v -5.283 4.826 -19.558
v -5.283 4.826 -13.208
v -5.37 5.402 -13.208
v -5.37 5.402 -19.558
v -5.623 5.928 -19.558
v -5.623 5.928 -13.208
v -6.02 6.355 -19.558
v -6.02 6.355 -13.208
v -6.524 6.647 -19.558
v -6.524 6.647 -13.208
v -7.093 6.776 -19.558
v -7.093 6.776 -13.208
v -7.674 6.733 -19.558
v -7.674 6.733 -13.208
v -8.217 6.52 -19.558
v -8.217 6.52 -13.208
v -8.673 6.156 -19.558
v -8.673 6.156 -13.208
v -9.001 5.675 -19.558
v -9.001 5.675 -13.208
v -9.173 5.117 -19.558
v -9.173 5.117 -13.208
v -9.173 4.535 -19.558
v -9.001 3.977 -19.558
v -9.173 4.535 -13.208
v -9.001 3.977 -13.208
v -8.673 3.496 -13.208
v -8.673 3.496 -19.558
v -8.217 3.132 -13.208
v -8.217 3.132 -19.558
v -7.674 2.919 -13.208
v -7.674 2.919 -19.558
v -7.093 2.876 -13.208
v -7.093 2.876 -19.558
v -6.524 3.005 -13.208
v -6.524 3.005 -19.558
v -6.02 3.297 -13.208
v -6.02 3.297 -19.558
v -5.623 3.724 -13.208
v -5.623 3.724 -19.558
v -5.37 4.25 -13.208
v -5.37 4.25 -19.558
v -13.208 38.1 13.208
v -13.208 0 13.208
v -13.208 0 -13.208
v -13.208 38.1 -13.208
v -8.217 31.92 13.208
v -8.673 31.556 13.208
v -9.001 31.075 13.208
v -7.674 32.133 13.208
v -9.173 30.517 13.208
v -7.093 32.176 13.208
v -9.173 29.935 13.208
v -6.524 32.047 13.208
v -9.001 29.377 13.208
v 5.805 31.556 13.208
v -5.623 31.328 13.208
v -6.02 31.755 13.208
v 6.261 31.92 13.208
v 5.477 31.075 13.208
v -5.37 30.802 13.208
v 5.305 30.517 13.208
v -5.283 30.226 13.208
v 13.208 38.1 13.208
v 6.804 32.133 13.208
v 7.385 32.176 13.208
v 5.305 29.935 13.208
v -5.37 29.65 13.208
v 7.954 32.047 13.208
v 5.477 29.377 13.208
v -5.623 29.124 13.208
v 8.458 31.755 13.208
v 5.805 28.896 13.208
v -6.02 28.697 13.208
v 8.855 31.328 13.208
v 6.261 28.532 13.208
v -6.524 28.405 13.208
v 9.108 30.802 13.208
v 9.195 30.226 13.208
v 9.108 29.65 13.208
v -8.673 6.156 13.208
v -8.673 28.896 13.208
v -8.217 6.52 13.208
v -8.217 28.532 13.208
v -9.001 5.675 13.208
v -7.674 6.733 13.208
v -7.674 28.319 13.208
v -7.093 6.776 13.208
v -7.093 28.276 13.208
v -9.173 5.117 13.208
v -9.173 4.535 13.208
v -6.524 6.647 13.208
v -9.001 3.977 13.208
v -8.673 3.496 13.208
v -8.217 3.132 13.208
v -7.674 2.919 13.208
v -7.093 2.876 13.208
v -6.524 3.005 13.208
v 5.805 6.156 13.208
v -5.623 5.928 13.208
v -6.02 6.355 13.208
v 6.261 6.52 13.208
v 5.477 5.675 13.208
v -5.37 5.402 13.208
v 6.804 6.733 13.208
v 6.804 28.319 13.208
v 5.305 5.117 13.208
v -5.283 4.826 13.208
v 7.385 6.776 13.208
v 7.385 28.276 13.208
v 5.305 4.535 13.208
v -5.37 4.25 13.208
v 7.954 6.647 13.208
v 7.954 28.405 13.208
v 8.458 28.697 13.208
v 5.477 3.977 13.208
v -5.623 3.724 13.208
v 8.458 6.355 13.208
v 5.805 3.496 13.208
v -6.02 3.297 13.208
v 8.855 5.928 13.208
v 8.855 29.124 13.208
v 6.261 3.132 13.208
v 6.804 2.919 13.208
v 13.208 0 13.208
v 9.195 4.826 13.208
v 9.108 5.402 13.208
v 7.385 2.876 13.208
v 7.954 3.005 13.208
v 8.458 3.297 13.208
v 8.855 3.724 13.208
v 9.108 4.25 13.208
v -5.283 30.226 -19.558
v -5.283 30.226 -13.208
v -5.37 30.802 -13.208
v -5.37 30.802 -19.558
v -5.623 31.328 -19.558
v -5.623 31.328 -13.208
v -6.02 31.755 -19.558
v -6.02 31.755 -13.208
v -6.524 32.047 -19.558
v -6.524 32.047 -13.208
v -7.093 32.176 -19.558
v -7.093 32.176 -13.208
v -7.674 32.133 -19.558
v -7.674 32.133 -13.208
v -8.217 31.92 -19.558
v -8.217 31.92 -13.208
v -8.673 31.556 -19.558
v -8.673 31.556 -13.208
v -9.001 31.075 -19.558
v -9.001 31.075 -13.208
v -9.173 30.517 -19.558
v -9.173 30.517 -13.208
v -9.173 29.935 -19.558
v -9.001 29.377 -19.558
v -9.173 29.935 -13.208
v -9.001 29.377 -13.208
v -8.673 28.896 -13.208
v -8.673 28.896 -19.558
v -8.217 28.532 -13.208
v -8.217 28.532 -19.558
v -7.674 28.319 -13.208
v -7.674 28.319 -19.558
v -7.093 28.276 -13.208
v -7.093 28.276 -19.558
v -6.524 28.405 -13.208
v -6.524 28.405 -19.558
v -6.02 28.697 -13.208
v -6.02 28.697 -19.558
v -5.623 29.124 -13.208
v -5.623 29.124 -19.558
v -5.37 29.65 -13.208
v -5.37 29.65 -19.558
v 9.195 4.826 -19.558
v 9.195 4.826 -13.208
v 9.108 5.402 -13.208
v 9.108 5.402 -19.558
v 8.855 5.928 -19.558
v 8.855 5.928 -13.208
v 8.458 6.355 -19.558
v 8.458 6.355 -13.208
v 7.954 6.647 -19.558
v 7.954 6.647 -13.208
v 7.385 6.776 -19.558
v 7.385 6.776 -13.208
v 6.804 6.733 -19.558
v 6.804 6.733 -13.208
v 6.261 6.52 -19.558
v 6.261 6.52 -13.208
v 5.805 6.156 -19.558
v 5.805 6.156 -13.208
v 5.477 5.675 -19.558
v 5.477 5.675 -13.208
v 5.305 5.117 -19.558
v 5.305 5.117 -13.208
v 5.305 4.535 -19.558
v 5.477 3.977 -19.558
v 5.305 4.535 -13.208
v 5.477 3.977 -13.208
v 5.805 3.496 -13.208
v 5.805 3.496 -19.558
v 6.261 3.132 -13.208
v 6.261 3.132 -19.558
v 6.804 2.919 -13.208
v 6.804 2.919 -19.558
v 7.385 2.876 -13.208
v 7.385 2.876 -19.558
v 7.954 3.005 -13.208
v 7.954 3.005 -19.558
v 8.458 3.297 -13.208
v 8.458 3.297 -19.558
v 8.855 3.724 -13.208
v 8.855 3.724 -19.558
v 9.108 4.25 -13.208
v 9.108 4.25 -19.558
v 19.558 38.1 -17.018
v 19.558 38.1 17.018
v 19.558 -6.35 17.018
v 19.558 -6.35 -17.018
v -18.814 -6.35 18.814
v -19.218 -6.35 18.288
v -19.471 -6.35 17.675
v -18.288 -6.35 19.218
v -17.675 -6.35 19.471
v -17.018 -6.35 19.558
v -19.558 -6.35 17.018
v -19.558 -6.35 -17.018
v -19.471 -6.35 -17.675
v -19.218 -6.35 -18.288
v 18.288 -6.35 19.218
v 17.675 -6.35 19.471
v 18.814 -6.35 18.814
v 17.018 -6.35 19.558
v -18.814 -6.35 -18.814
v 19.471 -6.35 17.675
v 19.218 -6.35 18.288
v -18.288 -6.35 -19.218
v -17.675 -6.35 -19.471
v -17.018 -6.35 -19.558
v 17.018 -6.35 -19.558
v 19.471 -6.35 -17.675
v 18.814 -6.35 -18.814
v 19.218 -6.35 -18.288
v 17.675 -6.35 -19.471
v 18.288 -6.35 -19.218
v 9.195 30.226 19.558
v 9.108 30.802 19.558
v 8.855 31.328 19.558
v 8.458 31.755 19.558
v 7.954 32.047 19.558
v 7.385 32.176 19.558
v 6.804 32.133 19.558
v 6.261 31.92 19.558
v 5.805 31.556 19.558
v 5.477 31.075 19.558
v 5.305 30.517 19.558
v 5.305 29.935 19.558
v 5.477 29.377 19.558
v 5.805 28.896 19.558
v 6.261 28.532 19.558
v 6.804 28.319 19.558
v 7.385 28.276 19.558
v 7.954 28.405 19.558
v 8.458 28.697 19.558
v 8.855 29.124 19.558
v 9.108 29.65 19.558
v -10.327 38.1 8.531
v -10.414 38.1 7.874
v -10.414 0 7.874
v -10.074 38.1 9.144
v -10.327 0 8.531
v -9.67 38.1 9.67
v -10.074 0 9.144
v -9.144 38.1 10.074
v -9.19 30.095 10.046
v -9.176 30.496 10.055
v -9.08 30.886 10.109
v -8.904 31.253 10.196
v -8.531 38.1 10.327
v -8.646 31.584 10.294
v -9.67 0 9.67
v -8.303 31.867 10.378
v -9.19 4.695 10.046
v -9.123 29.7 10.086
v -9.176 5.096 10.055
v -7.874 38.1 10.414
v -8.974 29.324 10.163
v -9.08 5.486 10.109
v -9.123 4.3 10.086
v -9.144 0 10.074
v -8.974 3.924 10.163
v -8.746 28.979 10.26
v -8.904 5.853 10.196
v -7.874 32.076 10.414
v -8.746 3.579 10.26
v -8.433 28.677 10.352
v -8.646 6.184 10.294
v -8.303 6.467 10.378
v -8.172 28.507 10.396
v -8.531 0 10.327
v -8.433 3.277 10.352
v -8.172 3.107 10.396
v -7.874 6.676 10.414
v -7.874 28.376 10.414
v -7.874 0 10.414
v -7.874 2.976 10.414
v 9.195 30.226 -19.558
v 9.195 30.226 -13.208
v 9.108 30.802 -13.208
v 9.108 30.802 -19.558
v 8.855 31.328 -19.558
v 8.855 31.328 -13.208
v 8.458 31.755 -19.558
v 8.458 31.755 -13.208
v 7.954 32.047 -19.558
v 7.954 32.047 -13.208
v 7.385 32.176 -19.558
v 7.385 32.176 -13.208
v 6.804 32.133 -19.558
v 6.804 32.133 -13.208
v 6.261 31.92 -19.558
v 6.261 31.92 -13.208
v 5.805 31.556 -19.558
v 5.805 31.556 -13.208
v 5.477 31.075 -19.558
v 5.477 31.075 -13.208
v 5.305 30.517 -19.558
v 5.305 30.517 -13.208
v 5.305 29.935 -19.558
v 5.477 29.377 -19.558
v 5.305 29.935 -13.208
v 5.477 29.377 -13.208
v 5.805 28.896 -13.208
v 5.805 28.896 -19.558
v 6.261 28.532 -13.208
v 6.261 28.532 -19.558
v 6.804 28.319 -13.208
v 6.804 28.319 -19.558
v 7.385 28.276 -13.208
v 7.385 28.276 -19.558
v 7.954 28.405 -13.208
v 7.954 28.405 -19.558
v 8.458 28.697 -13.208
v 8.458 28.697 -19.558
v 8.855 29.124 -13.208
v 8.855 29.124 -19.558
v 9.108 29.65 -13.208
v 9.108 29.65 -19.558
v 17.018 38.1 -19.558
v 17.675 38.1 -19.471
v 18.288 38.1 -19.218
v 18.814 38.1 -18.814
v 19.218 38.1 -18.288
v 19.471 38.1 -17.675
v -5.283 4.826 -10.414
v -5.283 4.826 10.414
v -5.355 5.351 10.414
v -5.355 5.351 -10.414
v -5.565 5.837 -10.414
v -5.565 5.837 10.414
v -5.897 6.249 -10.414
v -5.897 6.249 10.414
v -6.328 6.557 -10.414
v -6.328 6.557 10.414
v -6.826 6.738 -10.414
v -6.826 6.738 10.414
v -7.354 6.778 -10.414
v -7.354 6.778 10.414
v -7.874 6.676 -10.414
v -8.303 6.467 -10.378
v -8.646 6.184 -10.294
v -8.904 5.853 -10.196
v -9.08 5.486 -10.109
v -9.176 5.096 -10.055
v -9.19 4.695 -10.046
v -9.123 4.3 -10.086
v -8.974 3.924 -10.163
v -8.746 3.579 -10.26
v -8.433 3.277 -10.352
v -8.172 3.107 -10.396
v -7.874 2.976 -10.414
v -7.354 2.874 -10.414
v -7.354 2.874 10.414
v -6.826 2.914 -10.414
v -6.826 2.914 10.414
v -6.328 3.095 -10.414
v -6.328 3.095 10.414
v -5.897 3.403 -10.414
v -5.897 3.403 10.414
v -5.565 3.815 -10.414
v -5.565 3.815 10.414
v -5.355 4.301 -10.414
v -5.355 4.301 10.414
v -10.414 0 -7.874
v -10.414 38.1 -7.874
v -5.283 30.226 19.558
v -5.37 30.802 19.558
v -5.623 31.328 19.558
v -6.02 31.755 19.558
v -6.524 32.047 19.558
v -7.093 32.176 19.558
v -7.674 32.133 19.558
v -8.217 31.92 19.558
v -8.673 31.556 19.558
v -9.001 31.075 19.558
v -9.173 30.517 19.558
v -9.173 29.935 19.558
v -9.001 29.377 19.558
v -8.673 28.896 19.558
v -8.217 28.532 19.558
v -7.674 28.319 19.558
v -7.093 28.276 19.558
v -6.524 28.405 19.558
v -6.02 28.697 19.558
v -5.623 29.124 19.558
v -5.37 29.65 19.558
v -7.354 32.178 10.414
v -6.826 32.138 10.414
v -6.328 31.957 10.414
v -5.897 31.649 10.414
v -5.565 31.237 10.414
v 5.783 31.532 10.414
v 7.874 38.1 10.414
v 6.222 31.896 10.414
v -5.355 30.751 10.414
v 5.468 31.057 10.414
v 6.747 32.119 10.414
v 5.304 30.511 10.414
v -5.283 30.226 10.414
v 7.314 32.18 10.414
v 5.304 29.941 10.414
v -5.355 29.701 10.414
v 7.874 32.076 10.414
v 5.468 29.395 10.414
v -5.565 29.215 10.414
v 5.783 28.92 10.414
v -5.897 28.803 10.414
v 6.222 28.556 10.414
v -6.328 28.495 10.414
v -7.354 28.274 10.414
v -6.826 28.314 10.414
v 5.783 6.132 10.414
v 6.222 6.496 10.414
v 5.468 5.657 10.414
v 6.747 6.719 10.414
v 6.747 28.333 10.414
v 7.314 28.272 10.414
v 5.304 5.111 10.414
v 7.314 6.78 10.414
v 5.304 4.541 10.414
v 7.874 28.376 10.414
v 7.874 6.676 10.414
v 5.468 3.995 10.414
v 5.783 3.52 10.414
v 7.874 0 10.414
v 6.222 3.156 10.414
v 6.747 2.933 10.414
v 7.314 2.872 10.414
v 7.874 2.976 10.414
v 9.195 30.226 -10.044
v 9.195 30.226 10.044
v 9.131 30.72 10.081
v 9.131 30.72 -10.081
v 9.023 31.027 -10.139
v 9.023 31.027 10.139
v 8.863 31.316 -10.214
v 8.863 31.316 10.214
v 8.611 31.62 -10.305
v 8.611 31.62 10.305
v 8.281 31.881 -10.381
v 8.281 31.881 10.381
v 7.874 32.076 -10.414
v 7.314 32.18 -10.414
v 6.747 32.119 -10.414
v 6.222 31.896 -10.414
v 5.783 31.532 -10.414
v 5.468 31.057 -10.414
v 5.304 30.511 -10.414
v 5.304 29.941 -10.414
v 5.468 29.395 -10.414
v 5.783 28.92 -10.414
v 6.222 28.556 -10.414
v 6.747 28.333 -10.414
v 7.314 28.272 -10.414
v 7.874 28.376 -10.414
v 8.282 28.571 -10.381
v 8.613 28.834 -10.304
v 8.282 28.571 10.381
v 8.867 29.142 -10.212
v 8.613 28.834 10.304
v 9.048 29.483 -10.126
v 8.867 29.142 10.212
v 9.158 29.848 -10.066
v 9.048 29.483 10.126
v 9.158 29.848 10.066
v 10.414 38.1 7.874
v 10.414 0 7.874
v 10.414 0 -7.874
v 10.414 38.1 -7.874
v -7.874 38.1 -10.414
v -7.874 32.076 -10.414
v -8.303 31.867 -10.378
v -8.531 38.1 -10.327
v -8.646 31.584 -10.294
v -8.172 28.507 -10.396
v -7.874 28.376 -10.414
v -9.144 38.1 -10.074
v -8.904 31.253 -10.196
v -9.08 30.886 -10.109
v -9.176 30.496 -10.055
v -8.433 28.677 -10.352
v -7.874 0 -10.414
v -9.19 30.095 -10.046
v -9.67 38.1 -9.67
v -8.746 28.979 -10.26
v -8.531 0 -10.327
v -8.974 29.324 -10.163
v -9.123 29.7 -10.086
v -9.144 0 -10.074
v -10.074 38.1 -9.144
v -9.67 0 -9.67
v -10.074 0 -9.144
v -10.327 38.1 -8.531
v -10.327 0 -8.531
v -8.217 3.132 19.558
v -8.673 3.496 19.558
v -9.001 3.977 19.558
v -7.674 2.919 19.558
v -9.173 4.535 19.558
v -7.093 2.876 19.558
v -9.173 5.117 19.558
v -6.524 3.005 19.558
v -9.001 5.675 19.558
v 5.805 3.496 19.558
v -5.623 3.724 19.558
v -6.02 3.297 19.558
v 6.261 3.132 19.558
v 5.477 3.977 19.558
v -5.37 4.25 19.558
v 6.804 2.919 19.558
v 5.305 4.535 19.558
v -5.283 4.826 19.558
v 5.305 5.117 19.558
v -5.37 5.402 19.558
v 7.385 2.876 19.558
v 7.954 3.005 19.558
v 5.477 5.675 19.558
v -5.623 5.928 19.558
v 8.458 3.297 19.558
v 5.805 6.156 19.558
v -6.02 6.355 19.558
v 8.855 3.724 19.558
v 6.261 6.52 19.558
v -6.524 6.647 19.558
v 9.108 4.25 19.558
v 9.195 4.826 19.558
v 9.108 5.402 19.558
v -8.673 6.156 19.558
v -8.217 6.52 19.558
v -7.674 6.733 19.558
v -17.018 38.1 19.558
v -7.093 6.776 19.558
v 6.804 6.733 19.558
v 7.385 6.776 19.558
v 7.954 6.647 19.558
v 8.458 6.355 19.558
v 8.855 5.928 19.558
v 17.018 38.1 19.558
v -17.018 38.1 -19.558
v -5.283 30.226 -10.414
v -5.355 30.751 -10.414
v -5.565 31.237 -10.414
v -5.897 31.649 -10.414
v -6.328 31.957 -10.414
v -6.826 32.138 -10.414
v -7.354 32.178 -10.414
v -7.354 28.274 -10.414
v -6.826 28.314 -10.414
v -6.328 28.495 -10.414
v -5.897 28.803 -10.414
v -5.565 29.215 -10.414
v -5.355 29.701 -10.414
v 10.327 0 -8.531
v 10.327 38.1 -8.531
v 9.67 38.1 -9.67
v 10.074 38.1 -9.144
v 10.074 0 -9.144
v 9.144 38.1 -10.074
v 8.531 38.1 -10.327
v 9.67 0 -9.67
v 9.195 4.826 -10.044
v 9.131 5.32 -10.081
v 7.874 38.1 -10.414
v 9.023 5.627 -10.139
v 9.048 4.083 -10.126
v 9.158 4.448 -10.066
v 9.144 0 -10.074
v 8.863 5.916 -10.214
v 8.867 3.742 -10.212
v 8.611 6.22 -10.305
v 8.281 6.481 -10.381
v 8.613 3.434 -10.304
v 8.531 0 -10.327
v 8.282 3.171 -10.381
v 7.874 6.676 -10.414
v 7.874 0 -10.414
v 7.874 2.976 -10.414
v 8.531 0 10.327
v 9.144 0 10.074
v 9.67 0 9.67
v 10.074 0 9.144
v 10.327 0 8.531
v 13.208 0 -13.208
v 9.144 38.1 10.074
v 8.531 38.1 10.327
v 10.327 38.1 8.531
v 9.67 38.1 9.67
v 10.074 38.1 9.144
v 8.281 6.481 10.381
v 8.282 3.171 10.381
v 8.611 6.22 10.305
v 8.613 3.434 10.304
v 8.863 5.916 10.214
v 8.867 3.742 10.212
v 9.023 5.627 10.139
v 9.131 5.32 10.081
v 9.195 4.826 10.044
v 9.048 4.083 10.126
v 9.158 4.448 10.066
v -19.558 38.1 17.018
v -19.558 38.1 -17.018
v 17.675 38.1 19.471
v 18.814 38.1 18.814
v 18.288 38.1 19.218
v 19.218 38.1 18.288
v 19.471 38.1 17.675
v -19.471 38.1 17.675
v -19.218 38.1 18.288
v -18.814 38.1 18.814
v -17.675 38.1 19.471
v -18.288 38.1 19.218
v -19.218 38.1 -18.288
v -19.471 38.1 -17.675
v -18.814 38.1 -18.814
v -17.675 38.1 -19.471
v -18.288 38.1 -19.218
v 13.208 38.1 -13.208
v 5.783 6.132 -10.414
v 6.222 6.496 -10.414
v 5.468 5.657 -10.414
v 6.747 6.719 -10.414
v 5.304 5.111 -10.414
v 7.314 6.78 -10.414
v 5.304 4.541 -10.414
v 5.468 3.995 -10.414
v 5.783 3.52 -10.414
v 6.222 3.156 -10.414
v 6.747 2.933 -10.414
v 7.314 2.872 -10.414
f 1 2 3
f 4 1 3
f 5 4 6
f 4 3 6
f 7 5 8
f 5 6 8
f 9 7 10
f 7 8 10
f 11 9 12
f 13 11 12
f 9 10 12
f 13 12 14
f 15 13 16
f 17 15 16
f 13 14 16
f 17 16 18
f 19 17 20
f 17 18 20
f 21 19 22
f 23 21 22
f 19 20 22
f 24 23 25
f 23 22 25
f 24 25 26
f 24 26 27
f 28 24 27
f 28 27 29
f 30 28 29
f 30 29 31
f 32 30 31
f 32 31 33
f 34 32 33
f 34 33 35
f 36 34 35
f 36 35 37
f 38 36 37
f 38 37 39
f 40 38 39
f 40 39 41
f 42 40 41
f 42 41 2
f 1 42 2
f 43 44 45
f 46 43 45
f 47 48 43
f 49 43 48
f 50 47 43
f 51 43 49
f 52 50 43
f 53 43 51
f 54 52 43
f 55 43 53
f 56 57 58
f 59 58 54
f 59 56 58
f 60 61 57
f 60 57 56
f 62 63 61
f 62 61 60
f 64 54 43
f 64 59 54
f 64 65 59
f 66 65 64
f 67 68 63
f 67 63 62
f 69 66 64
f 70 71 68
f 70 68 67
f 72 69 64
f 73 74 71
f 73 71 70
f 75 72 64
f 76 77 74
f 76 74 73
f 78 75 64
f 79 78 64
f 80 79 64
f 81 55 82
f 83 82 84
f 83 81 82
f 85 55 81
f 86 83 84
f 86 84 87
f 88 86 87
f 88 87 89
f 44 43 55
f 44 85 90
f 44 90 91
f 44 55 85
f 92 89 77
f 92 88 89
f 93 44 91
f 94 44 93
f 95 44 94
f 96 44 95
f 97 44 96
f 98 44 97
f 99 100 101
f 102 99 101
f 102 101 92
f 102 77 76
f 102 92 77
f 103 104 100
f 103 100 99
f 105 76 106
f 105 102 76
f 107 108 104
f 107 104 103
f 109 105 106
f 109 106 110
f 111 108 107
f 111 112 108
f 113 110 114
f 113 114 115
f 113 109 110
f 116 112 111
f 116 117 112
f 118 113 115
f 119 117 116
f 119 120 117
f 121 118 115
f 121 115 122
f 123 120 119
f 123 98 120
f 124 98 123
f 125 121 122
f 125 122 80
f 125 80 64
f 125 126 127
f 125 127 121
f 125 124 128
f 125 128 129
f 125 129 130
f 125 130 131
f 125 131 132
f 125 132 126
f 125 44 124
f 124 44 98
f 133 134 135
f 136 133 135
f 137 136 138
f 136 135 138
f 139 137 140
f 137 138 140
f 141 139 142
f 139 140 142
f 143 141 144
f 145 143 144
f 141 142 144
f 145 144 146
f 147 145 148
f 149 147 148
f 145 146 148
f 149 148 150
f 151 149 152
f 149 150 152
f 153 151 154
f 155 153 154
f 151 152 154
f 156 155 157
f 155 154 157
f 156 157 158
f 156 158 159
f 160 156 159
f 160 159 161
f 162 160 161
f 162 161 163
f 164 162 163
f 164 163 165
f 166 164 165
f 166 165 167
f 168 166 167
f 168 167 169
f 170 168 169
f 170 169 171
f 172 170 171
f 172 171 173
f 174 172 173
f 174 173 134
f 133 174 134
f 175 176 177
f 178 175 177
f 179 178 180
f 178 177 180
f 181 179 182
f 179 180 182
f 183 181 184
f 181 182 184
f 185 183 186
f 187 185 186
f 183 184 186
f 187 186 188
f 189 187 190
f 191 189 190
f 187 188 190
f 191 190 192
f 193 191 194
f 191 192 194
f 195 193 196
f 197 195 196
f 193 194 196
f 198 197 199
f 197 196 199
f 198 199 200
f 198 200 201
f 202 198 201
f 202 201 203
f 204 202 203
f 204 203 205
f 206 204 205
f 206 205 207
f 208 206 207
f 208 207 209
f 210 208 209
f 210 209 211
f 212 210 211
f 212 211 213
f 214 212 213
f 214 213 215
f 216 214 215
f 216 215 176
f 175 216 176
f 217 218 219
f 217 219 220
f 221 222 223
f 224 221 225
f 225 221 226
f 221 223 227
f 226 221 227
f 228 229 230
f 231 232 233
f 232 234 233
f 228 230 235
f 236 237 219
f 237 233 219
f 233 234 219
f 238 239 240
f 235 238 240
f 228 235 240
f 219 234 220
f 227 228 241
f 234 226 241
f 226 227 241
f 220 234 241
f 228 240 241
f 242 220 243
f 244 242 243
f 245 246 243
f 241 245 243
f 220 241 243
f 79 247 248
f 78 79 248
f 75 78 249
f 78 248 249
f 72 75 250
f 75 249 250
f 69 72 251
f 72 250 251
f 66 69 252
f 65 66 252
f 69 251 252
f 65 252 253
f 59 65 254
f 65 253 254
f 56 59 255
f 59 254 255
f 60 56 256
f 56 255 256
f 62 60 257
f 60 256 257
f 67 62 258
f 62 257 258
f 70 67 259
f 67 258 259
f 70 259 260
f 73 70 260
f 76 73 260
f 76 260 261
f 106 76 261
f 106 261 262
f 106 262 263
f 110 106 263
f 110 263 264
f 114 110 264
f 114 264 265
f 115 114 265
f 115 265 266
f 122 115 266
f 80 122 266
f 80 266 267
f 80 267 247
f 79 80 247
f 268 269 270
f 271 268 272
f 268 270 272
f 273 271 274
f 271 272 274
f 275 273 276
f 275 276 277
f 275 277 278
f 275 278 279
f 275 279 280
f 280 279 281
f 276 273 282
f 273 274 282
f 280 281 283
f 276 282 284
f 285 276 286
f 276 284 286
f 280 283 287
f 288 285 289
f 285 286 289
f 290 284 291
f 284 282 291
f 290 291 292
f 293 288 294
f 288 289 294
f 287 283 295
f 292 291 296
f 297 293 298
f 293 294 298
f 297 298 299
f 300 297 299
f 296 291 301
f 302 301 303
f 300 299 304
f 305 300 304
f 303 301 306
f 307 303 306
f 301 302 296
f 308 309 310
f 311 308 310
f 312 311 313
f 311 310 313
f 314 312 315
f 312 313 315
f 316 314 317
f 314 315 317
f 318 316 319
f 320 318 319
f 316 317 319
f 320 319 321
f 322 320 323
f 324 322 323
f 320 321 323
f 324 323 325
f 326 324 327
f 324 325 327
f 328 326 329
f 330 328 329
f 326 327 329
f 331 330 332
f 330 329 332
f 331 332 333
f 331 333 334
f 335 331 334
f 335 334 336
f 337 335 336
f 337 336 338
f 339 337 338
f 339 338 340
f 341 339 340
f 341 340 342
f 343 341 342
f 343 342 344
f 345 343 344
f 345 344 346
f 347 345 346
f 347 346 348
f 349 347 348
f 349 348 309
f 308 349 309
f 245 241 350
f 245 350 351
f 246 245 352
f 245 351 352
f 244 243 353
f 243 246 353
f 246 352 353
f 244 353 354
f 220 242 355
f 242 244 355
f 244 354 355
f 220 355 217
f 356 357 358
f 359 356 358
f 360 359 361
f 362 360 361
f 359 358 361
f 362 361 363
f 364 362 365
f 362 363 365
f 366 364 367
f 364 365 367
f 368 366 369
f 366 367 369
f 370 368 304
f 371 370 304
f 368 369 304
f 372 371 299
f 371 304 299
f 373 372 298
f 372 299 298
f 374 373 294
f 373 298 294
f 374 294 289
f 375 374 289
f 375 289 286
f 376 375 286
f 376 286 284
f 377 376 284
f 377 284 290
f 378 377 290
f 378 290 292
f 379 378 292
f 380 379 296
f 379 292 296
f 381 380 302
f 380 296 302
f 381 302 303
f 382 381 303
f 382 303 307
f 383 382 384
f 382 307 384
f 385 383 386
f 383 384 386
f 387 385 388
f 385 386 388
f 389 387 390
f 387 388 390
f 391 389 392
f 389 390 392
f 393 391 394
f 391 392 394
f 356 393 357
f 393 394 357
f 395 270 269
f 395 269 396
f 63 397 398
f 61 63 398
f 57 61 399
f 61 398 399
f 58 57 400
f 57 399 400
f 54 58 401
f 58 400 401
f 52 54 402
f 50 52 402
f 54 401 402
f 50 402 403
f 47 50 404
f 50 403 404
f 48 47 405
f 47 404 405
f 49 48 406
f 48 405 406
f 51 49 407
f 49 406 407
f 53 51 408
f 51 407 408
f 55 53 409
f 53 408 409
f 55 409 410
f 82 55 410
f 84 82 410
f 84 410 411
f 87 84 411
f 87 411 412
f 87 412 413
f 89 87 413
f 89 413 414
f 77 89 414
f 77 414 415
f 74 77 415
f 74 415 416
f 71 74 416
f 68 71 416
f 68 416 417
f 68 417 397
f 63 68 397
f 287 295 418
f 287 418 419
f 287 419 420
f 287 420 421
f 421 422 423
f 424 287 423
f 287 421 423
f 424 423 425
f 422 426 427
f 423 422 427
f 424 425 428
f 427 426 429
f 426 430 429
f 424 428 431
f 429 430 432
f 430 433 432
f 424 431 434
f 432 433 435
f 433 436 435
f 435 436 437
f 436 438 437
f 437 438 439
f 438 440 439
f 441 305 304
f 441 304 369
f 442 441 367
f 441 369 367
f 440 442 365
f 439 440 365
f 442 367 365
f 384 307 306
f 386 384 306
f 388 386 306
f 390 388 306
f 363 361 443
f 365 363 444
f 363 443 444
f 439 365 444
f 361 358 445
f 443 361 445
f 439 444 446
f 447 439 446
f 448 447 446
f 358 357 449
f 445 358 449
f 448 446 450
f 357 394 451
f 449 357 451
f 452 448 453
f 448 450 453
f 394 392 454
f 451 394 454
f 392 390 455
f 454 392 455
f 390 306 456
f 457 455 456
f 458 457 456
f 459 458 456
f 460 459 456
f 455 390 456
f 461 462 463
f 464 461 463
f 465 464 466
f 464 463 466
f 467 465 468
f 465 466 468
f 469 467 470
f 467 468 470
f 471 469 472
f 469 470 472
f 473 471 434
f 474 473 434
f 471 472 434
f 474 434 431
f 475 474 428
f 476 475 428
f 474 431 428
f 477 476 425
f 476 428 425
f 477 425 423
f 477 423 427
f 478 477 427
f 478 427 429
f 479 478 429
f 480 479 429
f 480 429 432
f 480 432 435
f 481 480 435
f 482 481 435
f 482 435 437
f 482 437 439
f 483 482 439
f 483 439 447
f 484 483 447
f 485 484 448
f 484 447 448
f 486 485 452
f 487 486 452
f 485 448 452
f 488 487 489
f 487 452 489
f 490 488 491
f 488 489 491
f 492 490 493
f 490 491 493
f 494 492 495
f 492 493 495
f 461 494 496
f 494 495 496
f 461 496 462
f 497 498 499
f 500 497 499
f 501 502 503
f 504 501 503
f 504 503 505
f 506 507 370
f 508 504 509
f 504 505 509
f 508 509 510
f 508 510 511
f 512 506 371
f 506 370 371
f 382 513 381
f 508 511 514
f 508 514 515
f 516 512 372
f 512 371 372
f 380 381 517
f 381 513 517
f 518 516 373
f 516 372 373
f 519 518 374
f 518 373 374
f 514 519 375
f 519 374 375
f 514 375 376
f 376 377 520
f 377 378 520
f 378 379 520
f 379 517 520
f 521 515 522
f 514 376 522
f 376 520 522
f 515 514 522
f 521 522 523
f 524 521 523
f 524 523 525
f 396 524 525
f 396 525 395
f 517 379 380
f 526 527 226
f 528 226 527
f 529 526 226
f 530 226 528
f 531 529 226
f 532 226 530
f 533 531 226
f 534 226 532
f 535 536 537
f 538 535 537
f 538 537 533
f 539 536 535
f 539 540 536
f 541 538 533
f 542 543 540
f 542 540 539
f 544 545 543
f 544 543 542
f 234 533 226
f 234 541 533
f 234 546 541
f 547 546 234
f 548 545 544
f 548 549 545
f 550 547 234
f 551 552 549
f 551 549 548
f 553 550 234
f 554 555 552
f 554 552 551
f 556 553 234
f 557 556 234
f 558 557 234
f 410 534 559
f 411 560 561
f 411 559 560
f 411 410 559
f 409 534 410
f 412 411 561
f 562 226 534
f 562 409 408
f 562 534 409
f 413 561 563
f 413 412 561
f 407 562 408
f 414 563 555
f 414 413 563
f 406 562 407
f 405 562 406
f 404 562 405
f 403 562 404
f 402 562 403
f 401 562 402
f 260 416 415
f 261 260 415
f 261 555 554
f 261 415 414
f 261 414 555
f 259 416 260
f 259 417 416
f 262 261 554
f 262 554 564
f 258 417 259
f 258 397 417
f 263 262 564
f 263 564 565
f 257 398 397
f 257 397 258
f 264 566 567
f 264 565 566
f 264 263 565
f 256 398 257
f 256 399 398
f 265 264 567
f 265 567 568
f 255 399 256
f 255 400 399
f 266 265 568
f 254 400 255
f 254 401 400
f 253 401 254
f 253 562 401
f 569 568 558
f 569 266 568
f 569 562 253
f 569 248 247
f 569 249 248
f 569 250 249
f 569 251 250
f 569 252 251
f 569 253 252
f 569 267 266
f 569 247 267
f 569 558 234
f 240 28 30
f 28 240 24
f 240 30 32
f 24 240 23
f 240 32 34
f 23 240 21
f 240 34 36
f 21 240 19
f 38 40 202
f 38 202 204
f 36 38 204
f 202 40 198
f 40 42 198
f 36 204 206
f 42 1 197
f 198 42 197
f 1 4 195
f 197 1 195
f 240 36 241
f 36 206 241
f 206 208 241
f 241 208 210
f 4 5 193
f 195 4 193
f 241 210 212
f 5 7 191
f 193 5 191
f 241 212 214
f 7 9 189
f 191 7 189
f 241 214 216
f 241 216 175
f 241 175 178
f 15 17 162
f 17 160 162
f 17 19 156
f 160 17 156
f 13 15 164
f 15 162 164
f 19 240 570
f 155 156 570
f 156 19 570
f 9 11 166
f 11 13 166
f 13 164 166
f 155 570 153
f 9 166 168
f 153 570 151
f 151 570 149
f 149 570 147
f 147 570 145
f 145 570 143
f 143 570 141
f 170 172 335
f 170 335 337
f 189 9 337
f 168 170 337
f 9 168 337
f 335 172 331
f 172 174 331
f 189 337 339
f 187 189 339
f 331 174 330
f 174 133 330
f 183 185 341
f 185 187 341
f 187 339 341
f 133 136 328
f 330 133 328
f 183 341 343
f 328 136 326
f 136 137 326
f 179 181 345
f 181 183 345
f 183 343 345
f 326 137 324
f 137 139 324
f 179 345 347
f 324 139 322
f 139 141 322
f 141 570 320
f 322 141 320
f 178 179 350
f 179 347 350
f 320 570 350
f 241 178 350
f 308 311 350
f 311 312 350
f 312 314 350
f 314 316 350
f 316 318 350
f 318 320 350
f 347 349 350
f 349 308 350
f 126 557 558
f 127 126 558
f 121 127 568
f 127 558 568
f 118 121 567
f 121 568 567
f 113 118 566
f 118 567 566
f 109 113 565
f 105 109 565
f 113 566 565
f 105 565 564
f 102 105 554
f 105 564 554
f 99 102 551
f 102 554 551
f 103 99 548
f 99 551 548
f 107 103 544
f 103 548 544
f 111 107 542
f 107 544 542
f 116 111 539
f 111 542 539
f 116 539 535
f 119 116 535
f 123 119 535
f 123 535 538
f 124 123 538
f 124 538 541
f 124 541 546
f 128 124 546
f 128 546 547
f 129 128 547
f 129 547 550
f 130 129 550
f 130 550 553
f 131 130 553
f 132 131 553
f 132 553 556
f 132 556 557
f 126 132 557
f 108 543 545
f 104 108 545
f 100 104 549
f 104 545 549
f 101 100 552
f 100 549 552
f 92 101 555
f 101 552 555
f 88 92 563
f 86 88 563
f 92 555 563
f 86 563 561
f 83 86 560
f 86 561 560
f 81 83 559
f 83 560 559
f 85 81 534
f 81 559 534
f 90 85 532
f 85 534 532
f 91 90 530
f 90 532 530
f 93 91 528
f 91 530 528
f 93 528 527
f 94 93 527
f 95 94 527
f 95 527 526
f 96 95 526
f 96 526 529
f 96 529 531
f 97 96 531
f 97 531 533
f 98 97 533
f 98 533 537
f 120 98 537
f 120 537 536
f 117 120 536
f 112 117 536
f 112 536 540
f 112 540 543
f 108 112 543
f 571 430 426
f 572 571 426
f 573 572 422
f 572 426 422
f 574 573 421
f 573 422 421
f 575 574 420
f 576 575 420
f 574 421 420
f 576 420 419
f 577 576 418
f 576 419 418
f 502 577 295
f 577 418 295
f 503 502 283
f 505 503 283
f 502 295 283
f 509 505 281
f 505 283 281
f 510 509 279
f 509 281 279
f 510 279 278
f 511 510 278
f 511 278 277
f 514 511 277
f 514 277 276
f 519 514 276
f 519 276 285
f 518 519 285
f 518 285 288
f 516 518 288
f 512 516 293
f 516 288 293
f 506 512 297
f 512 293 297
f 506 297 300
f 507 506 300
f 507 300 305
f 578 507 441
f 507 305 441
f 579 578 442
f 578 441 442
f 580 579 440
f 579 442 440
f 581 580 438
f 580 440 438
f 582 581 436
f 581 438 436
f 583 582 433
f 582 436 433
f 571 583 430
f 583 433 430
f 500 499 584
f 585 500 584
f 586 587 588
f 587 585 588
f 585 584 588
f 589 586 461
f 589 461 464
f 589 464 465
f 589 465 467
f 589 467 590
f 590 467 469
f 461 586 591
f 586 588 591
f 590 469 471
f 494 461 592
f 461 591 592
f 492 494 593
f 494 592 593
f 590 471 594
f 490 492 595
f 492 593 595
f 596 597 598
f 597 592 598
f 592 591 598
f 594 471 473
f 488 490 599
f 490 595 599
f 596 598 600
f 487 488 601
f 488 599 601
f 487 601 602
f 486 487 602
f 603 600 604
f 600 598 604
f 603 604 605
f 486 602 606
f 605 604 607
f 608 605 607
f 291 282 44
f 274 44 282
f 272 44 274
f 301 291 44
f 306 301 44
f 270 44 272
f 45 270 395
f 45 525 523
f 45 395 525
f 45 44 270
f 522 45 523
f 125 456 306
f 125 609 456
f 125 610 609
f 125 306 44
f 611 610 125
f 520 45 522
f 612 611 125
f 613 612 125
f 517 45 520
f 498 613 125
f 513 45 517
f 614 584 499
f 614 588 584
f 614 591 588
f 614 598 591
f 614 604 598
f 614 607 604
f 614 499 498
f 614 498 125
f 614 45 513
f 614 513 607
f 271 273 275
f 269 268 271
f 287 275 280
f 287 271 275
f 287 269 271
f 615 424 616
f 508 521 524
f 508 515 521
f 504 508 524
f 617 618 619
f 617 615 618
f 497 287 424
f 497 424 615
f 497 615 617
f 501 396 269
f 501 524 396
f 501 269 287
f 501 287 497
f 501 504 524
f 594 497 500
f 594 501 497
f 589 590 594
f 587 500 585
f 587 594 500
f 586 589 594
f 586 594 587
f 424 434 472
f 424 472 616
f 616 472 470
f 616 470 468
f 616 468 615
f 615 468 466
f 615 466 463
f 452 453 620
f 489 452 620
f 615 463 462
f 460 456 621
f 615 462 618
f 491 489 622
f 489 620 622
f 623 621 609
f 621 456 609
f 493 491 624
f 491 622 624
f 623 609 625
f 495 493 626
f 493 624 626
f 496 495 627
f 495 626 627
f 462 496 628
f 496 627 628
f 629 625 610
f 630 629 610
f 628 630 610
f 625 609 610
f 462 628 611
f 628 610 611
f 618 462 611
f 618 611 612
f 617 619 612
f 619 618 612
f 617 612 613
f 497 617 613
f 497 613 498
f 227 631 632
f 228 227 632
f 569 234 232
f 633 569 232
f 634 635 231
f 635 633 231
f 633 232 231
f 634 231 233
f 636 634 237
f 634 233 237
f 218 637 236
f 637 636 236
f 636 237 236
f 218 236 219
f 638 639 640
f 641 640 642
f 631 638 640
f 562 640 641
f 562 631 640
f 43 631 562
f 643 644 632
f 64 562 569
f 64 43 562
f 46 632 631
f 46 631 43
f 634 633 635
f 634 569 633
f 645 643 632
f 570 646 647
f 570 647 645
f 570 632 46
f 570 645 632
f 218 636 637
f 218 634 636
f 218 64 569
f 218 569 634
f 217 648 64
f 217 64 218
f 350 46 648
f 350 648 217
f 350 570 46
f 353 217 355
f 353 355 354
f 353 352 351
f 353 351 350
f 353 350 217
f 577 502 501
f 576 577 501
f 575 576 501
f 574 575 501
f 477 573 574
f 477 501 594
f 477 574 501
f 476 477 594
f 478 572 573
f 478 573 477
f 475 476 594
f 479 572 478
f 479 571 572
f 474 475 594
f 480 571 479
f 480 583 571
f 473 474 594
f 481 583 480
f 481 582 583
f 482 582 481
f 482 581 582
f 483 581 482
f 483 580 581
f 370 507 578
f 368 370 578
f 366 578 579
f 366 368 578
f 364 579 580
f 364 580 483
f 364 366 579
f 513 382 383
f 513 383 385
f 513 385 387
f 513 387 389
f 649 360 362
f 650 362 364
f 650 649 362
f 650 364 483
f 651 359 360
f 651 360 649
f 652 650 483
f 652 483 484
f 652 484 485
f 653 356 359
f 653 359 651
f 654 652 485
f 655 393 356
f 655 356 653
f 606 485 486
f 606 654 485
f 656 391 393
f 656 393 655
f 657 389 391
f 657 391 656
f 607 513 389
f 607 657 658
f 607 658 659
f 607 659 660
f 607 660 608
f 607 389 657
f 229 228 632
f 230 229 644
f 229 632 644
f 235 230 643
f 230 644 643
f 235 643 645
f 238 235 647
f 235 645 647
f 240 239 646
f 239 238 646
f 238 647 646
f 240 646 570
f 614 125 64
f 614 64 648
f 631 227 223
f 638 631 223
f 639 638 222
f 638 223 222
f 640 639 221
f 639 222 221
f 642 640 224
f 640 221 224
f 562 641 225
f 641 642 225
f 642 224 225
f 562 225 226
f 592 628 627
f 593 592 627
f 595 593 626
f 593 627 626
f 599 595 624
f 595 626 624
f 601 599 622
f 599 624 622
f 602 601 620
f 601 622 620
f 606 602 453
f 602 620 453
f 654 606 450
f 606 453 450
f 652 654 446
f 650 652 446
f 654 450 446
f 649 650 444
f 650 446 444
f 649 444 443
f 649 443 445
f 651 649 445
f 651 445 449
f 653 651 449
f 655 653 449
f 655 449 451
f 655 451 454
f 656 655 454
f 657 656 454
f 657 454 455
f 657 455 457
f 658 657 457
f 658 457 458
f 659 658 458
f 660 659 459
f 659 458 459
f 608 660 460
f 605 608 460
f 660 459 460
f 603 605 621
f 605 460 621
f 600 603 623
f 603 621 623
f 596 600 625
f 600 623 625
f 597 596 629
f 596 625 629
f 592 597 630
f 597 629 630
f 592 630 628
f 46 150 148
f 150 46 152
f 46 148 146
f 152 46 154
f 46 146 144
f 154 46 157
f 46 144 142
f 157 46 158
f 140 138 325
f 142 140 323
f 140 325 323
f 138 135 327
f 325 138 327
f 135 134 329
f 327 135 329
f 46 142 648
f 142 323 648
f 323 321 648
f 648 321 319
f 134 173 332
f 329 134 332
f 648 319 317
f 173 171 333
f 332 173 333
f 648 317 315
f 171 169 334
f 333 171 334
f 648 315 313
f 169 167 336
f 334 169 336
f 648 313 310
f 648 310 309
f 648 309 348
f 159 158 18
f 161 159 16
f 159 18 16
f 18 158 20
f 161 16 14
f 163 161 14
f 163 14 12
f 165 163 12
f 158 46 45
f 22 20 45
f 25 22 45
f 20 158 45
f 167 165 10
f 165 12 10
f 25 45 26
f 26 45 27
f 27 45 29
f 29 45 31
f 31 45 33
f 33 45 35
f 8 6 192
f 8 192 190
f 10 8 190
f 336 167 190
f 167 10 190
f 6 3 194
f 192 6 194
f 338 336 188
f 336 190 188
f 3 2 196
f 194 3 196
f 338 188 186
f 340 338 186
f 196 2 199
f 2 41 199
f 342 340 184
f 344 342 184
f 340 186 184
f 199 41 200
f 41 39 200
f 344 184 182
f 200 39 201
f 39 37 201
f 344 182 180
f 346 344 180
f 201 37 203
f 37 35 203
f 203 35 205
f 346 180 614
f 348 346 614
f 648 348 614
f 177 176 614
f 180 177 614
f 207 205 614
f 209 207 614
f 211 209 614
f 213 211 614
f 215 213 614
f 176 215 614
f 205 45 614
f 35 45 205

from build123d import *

# Parameters (mm, degrees)
SKETCH1_W             = 20.828
SKETCH1_H             = 20.828
BOSS_EXTRUDE1_DEPTH   = 38.1
SKETCH1_W_2           = 39.116
SKETCH1_H_2           = 39.116
SKETCH1_W_3           = 26.416
SKETCH1_H_3           = 26.416
BOSS_EXTRUDE1_2_DEPTH = 38.1
SKETCH2_R             = 1.9558
CUT_EXTRUDE1_DEPTH    = 59.001610495
SKETCH1_2_W           = 39.116
SKETCH1_2_H           = 39.116
SKETCH1_2_W_2         = 26.416
SKETCH1_2_H_2         = 26.416
SKETCH1_2_W_3         = 20.828
SKETCH1_2_H_3         = 20.828
BOSS_EXTRUDE2_DEPTH   = 6.35
FILLET1_R             = 2.54


with BuildPart() as part:
    # Sketch1 → Boss-Extrude1 (new body)
    with BuildSketch(Plane(origin=(0, 0, 0), x_dir=(1, 0, 0), z_dir=(0, 1, 0))):
        Rectangle(SKETCH1_W, SKETCH1_H)
    extrude(amount=BOSS_EXTRUDE1_DEPTH)


with BuildPart() as body_2:
    # Sketch1 → Boss-Extrude1 2 (new body)
    with BuildSketch(Plane(origin=(0, 0, 0), x_dir=(1, 0, 0), z_dir=(0, 1, 0))):
        Rectangle(SKETCH1_W_2, SKETCH1_H_2)
        Rectangle(SKETCH1_W_3, SKETCH1_H_3, mode=Mode.SUBTRACT)
    extrude(amount=BOSS_EXTRUDE1_2_DEPTH)


with BuildPart() as cut_extrude1_tool:
    # Sketch2 → Cut-Extrude1 (new, through all)
    with BuildSketch(Plane.XY.offset(19.558)):
        with Locations((-7.239, 30.226)):
            Circle(SKETCH2_R)
        with Locations((7.239, 30.226)):
            Circle(SKETCH2_R)
        with Locations((7.239, 4.826)):
            Circle(SKETCH2_R)
        with Locations((-7.239, 4.826)):
            Circle(SKETCH2_R)
    extrude(amount=-CUT_EXTRUDE1_DEPTH)


with BuildPart() as part_1:
    add(part.part)

    # Cut-Extrude1: cut by cut_extrude1_tool
    add(cut_extrude1_tool.part, mode=Mode.SUBTRACT)



with BuildPart() as body_2_1:
    add(body_2.part)

    # Cut-Extrude1: cut by cut_extrude1_tool
    add(cut_extrude1_tool.part, mode=Mode.SUBTRACT)


with BuildPart() as part_2:
    add(part_1.part)

    add(body_2_1.part)  # Boss-Extrude2 merges body 2
    # Sketch1<2> → Boss-Extrude2 (add)
    # profile 1 of 3: a face of its own
    with BuildSketch(Plane(origin=(0, 0, 0), x_dir=(1, 0, 0), z_dir=(0, 1, 0))):
        Rectangle(SKETCH1_2_W, SKETCH1_2_H)
        Rectangle(SKETCH1_2_W_2, SKETCH1_2_H_2, mode=Mode.SUBTRACT)
    # profile 2 of 3: a face of its own
    with BuildSketch(Plane(origin=(0, 0, 0), x_dir=(1, 0, 0), z_dir=(0, 1, 0))):
        Rectangle(SKETCH1_2_W_2, SKETCH1_2_H_2)
        Rectangle(SKETCH1_2_W_3, SKETCH1_2_H_3, mode=Mode.SUBTRACT)
    # profile 3 of 3: a face of its own
    with BuildSketch(Plane(origin=(0, 0, 0), x_dir=(1, 0, 0), z_dir=(0, 1, 0))):
        Rectangle(SKETCH1_2_W_3, SKETCH1_2_H_3)
    extrude(amount=-BOSS_EXTRUDE2_DEPTH)

    # Fillet1
    # the kernel refuses this fillet: 2.54 mm, written as the material it takes off along each edge
    with BuildSketch(Plane(origin=(-19.558, 44.45, -19.558), x_dir=(0, 0, 1), z_dir=(0, -1, 0)), Plane(origin=(-19.558, -12.7, 19.558), x_dir=(0, 0, -1), z_dir=(0, 1, 0))) as fillet1_piece_1:
        with BuildLine():
            CenterArc((FILLET1_R, -FILLET1_R), FILLET1_R, 90, 90)
            Line((0, -FILLET1_R), (0, 0))
            Line((0, 0), (FILLET1_R, 0))
        make_face()
    extrude(amount=57.15, mode=Mode.SUBTRACT)
    with BuildSketch(Plane(origin=(19.558, 44.45, -19.558), x_dir=(0, 0, 1), z_dir=(0, -1, 0)), Plane(origin=(19.558, -12.7, 19.558), x_dir=(0, 0, -1), z_dir=(0, 1, 0))) as fillet1_piece_2:
        with BuildLine():
            CenterArc((FILLET1_R, FILLET1_R), FILLET1_R, 180, 90)
            Line((0, FILLET1_R), (0, 0))
            Line((0, 0), (FILLET1_R, 0))
        make_face()
    extrude(amount=57.15, mode=Mode.SUBTRACT)
    with BuildSketch(Plane(origin=(10.414, 0, -10.414), x_dir=(-1, 0, 0), z_dir=(0, 1, 0)), Plane(origin=(-10.414, 0, -10.414), x_dir=(0, 0, 1), z_dir=(0, 1, 0))) as fillet1_piece_3:
        with BuildLine():
            CenterArc((FILLET1_R, FILLET1_R), FILLET1_R, 180, 90)
            Line((0, FILLET1_R), (0, 0))
            Line((0, 0), (FILLET1_R, 0))
        make_face()
    extrude(amount=44.45, mode=Mode.SUBTRACT)
    with BuildSketch(Plane(origin=(-10.414, 0, 10.414), x_dir=(0, 0, -1), z_dir=(0, 1, 0)), Plane(origin=(10.414, 0, 10.414), x_dir=(-1, 0, 0), z_dir=(0, 1, 0))) as fillet1_piece_4:
        with BuildLine():
            CenterArc((FILLET1_R, -FILLET1_R), FILLET1_R, 90, 90)
            Line((0, -FILLET1_R), (0, 0))
            Line((0, 0), (FILLET1_R, 0))
        make_face()
    extrude(amount=44.45, mode=Mode.SUBTRACT)


solid = part_2.part
